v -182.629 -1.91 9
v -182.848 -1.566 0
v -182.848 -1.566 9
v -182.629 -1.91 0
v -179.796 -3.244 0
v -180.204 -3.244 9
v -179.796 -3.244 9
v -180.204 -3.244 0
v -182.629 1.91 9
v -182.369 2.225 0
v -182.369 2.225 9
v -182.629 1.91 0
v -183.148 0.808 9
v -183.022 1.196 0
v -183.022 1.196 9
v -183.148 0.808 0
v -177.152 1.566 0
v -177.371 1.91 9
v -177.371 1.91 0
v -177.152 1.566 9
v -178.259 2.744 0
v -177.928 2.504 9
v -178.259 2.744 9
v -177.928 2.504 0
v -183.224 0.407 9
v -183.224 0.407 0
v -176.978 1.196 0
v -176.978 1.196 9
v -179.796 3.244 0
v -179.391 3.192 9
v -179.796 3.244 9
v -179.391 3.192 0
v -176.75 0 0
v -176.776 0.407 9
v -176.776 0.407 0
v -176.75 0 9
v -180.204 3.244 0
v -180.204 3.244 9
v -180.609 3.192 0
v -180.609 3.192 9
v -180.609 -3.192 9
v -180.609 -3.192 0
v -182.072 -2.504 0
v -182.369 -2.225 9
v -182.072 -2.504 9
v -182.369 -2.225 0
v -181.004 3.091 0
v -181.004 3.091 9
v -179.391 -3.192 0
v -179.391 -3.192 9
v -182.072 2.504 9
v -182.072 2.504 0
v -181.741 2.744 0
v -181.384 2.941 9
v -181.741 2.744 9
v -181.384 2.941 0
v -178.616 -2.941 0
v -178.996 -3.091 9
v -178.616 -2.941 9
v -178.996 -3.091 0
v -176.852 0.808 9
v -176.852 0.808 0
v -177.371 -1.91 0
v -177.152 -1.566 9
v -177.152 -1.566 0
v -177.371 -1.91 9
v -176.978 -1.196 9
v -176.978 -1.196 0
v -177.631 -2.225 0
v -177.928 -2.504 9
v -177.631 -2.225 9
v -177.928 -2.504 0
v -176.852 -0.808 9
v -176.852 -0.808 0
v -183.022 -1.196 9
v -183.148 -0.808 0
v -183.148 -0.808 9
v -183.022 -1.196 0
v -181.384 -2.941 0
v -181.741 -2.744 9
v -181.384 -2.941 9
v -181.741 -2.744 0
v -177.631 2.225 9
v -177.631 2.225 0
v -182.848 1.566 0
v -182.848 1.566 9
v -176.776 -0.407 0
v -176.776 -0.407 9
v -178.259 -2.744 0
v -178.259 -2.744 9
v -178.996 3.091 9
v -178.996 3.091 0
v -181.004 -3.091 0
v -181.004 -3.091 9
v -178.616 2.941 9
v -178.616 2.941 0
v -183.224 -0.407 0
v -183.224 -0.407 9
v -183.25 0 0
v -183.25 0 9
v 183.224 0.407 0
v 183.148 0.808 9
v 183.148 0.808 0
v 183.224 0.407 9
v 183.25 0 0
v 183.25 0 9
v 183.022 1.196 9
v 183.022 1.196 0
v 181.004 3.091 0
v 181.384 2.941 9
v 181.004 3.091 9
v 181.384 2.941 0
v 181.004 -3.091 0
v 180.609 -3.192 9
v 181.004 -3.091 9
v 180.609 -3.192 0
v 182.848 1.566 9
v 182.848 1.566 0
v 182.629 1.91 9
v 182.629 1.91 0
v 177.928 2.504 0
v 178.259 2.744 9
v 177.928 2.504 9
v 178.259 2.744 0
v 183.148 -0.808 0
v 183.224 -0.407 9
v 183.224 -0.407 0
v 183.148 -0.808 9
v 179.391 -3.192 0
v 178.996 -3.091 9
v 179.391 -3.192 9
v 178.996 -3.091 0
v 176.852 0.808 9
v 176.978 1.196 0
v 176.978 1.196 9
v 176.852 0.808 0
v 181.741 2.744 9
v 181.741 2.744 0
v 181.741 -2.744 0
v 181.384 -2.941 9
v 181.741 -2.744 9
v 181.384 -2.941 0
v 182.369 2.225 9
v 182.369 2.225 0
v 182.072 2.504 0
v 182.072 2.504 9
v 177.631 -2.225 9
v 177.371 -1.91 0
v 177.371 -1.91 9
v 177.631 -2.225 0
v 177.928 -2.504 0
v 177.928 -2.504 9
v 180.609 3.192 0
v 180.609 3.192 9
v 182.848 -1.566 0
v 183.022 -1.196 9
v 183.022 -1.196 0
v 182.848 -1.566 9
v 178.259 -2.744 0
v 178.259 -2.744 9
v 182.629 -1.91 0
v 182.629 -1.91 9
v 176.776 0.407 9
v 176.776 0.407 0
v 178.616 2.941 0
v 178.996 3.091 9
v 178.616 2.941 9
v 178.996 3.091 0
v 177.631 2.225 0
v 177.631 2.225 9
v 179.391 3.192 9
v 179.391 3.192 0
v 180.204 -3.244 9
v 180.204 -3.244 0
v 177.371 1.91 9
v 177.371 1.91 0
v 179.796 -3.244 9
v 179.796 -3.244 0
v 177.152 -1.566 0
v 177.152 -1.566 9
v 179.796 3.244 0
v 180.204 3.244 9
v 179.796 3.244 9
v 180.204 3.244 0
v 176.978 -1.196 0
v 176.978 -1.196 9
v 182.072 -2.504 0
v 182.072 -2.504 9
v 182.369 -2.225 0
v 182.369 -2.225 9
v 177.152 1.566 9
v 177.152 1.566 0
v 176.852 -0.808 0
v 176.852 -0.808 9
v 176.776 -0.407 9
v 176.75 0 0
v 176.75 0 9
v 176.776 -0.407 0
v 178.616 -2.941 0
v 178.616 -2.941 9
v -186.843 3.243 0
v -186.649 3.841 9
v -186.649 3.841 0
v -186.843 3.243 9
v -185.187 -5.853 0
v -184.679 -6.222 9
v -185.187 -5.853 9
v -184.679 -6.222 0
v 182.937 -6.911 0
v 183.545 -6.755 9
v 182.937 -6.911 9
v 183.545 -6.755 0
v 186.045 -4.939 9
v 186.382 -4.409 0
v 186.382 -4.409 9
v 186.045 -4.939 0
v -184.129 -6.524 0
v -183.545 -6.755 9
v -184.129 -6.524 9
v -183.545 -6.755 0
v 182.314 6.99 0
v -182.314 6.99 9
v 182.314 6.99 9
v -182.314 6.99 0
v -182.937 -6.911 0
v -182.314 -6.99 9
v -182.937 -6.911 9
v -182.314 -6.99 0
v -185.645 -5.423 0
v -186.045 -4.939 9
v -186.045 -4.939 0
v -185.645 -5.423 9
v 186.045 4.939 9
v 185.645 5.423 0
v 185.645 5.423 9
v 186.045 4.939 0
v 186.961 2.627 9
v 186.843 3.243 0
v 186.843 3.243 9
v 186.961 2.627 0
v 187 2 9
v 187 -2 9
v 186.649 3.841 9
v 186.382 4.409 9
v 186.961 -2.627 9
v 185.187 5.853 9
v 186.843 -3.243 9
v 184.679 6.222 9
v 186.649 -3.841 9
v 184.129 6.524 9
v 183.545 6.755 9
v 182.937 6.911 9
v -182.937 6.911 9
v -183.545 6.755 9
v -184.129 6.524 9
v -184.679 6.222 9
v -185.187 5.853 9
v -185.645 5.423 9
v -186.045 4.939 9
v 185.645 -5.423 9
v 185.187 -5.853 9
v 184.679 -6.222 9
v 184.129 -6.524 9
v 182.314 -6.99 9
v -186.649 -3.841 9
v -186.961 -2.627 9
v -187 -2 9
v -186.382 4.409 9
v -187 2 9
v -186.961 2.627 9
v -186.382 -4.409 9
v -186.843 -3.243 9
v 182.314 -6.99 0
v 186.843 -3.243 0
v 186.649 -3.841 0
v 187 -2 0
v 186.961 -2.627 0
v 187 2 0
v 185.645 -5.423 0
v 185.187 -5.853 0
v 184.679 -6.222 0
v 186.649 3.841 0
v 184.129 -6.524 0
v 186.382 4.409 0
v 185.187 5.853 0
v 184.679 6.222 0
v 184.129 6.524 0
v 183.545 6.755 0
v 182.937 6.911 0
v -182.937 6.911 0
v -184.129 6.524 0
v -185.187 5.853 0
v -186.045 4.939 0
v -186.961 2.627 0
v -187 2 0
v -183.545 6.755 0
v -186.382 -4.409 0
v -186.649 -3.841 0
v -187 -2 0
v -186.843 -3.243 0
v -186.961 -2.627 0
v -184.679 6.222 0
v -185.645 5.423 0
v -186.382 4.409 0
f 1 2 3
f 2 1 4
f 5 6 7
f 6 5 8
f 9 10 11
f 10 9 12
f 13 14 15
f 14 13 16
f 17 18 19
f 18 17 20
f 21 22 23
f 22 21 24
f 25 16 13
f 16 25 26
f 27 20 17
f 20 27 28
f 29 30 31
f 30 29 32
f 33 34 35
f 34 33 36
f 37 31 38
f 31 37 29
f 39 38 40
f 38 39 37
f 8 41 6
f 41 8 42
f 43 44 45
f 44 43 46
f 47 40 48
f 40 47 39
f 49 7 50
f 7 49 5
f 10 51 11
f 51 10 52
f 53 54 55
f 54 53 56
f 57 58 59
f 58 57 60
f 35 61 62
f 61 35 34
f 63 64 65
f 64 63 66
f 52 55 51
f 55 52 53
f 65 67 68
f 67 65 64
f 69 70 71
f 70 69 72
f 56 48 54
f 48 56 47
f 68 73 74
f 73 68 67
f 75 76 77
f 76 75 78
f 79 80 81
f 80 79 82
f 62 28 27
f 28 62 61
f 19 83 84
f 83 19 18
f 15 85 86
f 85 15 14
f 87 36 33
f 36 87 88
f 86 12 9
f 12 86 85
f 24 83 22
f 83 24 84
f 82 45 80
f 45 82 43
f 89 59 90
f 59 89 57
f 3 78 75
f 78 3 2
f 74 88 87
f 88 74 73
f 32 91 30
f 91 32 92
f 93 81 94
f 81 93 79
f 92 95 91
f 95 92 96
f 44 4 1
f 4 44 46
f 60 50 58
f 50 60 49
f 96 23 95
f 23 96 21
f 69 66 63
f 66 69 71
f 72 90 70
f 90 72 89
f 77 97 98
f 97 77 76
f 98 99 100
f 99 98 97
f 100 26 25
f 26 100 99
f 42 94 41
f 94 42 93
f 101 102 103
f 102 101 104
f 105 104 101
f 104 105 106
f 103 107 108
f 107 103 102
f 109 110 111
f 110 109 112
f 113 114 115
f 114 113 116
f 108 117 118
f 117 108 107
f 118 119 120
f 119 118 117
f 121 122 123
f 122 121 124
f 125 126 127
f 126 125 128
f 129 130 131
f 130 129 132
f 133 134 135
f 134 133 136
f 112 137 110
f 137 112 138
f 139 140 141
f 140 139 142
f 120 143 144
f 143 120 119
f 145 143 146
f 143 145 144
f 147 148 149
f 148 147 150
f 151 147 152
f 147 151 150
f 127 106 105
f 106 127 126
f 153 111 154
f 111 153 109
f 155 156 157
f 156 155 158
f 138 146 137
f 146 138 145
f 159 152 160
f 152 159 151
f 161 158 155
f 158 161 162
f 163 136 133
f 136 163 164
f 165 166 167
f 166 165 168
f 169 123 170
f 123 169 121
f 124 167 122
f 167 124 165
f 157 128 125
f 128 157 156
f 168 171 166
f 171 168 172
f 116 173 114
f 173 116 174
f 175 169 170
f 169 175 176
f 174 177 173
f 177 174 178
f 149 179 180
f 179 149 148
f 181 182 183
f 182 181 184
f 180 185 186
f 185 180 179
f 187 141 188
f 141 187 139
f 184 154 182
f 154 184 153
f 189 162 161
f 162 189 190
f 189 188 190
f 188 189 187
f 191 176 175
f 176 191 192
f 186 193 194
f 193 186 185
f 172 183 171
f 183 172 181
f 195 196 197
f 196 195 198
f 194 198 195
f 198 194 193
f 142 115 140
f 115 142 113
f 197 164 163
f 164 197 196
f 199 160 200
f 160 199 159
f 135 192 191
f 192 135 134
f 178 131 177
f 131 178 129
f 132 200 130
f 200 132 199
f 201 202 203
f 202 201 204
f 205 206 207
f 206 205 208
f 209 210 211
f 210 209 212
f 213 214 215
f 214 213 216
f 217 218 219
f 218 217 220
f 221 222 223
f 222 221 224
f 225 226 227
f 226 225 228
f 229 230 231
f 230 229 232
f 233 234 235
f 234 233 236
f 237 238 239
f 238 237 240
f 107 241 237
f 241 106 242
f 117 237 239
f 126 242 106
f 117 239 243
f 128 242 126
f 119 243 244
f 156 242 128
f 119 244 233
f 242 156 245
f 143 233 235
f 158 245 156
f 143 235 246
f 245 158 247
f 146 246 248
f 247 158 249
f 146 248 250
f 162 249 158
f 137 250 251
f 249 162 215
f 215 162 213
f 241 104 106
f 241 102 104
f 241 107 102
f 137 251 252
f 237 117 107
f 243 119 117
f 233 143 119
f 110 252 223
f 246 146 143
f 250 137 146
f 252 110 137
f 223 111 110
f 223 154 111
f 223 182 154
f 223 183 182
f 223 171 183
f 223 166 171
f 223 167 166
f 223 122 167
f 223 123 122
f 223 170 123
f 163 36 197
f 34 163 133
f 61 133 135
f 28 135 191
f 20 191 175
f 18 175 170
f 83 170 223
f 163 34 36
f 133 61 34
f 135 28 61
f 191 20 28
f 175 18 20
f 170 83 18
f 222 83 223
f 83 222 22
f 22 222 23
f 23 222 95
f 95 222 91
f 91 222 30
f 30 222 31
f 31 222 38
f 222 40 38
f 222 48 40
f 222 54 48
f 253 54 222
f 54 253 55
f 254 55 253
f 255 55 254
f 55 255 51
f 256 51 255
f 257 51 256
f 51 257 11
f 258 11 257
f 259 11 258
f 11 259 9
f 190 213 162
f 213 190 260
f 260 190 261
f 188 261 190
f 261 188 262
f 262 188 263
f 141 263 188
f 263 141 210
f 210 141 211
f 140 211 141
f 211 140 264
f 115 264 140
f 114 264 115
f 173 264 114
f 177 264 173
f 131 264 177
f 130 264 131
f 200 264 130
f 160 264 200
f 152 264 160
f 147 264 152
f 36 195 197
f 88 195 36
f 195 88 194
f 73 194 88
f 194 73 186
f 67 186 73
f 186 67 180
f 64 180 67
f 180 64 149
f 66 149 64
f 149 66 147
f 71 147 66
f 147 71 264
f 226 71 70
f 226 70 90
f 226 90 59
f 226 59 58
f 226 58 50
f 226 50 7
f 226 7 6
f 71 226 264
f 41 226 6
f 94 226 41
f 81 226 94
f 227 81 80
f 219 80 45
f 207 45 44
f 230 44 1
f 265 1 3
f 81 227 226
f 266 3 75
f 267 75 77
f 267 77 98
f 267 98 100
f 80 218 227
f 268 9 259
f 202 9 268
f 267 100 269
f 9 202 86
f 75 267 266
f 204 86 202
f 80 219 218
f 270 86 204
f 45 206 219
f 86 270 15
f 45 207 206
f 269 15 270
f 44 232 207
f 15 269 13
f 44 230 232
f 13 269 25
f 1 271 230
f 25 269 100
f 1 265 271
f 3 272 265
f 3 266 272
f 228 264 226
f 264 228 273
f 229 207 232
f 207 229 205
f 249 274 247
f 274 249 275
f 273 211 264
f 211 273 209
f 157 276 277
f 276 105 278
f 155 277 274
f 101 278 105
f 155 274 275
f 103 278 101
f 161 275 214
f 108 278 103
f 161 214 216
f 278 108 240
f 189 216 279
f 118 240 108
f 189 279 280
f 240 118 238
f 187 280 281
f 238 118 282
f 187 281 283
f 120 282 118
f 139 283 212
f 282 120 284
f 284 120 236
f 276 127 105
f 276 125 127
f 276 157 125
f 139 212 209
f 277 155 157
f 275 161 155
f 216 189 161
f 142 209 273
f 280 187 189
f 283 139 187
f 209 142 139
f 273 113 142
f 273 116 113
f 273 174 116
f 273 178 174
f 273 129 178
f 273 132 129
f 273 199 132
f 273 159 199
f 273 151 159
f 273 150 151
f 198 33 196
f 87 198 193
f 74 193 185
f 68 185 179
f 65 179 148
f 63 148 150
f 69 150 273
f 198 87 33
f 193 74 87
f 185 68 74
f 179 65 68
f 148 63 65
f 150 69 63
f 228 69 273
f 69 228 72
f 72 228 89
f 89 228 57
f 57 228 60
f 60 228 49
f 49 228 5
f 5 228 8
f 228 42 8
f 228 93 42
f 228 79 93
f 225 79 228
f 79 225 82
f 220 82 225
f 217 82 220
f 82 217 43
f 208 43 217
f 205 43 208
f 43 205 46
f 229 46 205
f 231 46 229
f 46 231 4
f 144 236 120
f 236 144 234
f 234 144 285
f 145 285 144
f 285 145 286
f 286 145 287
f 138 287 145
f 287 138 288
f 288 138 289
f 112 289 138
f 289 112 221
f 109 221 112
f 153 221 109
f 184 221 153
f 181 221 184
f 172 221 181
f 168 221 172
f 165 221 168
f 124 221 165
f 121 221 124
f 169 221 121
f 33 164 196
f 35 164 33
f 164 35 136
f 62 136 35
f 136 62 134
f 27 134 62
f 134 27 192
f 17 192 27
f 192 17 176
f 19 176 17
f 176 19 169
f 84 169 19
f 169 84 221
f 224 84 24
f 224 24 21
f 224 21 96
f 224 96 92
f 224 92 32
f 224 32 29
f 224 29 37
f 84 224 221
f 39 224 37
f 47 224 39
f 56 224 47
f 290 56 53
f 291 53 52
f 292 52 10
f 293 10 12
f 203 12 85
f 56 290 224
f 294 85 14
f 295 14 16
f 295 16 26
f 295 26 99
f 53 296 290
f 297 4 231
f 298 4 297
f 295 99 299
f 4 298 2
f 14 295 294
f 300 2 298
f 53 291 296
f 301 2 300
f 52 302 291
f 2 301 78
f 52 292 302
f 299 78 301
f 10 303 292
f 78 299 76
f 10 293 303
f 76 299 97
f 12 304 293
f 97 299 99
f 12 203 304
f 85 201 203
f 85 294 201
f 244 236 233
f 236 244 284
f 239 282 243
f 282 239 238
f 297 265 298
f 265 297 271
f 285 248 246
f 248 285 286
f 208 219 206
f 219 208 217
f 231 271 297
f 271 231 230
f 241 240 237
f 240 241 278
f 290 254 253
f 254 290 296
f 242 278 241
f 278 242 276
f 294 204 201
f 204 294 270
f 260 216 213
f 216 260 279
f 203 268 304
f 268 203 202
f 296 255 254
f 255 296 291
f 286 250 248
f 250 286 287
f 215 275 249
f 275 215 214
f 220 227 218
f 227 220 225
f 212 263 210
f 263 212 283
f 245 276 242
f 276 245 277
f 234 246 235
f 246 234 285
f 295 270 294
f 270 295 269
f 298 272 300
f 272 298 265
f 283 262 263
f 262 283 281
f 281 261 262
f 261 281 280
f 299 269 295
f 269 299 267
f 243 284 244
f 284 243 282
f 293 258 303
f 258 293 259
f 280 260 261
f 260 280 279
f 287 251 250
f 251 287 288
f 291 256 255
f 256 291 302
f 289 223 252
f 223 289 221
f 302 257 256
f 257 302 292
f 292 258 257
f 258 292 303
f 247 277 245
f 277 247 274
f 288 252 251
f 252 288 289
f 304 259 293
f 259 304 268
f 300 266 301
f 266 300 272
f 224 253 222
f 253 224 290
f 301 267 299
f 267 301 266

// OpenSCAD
$fn = 50;


difference() {
	union() {
		hull() {
			translate(v = [-182.0000000000, 2.0000000000, 0]) {
				cylinder(h = 9, r = 5);
			}
			translate(v = [182.0000000000, 2.0000000000, 0]) {
				cylinder(h = 9, r = 5);
			}
			translate(v = [-182.0000000000, -2.0000000000, 0]) {
				cylinder(h = 9, r = 5);
			}
			translate(v = [182.0000000000, -2.0000000000, 0]) {
				cylinder(h = 9, r = 5);
			}
		}
	}
	union() {
		translate(v = [-180.0000000000, 0.0000000000, -100.0000000000]) {
			cylinder(h = 200, r = 3.2500000000);
		}
		translate(v = [-180.0000000000, 0.0000000000, -100.0000000000]) {
			cylinder(h = 200, r = 3.2500000000);
		}
		translate(v = [180.0000000000, 0.0000000000, -100.0000000000]) {
			cylinder(h = 200, r = 3.2500000000);
		}
		translate(v = [180.0000000000, 0.0000000000, -100.0000000000]) {
			cylinder(h = 200, r = 3.2500000000);
		}
	}
}
